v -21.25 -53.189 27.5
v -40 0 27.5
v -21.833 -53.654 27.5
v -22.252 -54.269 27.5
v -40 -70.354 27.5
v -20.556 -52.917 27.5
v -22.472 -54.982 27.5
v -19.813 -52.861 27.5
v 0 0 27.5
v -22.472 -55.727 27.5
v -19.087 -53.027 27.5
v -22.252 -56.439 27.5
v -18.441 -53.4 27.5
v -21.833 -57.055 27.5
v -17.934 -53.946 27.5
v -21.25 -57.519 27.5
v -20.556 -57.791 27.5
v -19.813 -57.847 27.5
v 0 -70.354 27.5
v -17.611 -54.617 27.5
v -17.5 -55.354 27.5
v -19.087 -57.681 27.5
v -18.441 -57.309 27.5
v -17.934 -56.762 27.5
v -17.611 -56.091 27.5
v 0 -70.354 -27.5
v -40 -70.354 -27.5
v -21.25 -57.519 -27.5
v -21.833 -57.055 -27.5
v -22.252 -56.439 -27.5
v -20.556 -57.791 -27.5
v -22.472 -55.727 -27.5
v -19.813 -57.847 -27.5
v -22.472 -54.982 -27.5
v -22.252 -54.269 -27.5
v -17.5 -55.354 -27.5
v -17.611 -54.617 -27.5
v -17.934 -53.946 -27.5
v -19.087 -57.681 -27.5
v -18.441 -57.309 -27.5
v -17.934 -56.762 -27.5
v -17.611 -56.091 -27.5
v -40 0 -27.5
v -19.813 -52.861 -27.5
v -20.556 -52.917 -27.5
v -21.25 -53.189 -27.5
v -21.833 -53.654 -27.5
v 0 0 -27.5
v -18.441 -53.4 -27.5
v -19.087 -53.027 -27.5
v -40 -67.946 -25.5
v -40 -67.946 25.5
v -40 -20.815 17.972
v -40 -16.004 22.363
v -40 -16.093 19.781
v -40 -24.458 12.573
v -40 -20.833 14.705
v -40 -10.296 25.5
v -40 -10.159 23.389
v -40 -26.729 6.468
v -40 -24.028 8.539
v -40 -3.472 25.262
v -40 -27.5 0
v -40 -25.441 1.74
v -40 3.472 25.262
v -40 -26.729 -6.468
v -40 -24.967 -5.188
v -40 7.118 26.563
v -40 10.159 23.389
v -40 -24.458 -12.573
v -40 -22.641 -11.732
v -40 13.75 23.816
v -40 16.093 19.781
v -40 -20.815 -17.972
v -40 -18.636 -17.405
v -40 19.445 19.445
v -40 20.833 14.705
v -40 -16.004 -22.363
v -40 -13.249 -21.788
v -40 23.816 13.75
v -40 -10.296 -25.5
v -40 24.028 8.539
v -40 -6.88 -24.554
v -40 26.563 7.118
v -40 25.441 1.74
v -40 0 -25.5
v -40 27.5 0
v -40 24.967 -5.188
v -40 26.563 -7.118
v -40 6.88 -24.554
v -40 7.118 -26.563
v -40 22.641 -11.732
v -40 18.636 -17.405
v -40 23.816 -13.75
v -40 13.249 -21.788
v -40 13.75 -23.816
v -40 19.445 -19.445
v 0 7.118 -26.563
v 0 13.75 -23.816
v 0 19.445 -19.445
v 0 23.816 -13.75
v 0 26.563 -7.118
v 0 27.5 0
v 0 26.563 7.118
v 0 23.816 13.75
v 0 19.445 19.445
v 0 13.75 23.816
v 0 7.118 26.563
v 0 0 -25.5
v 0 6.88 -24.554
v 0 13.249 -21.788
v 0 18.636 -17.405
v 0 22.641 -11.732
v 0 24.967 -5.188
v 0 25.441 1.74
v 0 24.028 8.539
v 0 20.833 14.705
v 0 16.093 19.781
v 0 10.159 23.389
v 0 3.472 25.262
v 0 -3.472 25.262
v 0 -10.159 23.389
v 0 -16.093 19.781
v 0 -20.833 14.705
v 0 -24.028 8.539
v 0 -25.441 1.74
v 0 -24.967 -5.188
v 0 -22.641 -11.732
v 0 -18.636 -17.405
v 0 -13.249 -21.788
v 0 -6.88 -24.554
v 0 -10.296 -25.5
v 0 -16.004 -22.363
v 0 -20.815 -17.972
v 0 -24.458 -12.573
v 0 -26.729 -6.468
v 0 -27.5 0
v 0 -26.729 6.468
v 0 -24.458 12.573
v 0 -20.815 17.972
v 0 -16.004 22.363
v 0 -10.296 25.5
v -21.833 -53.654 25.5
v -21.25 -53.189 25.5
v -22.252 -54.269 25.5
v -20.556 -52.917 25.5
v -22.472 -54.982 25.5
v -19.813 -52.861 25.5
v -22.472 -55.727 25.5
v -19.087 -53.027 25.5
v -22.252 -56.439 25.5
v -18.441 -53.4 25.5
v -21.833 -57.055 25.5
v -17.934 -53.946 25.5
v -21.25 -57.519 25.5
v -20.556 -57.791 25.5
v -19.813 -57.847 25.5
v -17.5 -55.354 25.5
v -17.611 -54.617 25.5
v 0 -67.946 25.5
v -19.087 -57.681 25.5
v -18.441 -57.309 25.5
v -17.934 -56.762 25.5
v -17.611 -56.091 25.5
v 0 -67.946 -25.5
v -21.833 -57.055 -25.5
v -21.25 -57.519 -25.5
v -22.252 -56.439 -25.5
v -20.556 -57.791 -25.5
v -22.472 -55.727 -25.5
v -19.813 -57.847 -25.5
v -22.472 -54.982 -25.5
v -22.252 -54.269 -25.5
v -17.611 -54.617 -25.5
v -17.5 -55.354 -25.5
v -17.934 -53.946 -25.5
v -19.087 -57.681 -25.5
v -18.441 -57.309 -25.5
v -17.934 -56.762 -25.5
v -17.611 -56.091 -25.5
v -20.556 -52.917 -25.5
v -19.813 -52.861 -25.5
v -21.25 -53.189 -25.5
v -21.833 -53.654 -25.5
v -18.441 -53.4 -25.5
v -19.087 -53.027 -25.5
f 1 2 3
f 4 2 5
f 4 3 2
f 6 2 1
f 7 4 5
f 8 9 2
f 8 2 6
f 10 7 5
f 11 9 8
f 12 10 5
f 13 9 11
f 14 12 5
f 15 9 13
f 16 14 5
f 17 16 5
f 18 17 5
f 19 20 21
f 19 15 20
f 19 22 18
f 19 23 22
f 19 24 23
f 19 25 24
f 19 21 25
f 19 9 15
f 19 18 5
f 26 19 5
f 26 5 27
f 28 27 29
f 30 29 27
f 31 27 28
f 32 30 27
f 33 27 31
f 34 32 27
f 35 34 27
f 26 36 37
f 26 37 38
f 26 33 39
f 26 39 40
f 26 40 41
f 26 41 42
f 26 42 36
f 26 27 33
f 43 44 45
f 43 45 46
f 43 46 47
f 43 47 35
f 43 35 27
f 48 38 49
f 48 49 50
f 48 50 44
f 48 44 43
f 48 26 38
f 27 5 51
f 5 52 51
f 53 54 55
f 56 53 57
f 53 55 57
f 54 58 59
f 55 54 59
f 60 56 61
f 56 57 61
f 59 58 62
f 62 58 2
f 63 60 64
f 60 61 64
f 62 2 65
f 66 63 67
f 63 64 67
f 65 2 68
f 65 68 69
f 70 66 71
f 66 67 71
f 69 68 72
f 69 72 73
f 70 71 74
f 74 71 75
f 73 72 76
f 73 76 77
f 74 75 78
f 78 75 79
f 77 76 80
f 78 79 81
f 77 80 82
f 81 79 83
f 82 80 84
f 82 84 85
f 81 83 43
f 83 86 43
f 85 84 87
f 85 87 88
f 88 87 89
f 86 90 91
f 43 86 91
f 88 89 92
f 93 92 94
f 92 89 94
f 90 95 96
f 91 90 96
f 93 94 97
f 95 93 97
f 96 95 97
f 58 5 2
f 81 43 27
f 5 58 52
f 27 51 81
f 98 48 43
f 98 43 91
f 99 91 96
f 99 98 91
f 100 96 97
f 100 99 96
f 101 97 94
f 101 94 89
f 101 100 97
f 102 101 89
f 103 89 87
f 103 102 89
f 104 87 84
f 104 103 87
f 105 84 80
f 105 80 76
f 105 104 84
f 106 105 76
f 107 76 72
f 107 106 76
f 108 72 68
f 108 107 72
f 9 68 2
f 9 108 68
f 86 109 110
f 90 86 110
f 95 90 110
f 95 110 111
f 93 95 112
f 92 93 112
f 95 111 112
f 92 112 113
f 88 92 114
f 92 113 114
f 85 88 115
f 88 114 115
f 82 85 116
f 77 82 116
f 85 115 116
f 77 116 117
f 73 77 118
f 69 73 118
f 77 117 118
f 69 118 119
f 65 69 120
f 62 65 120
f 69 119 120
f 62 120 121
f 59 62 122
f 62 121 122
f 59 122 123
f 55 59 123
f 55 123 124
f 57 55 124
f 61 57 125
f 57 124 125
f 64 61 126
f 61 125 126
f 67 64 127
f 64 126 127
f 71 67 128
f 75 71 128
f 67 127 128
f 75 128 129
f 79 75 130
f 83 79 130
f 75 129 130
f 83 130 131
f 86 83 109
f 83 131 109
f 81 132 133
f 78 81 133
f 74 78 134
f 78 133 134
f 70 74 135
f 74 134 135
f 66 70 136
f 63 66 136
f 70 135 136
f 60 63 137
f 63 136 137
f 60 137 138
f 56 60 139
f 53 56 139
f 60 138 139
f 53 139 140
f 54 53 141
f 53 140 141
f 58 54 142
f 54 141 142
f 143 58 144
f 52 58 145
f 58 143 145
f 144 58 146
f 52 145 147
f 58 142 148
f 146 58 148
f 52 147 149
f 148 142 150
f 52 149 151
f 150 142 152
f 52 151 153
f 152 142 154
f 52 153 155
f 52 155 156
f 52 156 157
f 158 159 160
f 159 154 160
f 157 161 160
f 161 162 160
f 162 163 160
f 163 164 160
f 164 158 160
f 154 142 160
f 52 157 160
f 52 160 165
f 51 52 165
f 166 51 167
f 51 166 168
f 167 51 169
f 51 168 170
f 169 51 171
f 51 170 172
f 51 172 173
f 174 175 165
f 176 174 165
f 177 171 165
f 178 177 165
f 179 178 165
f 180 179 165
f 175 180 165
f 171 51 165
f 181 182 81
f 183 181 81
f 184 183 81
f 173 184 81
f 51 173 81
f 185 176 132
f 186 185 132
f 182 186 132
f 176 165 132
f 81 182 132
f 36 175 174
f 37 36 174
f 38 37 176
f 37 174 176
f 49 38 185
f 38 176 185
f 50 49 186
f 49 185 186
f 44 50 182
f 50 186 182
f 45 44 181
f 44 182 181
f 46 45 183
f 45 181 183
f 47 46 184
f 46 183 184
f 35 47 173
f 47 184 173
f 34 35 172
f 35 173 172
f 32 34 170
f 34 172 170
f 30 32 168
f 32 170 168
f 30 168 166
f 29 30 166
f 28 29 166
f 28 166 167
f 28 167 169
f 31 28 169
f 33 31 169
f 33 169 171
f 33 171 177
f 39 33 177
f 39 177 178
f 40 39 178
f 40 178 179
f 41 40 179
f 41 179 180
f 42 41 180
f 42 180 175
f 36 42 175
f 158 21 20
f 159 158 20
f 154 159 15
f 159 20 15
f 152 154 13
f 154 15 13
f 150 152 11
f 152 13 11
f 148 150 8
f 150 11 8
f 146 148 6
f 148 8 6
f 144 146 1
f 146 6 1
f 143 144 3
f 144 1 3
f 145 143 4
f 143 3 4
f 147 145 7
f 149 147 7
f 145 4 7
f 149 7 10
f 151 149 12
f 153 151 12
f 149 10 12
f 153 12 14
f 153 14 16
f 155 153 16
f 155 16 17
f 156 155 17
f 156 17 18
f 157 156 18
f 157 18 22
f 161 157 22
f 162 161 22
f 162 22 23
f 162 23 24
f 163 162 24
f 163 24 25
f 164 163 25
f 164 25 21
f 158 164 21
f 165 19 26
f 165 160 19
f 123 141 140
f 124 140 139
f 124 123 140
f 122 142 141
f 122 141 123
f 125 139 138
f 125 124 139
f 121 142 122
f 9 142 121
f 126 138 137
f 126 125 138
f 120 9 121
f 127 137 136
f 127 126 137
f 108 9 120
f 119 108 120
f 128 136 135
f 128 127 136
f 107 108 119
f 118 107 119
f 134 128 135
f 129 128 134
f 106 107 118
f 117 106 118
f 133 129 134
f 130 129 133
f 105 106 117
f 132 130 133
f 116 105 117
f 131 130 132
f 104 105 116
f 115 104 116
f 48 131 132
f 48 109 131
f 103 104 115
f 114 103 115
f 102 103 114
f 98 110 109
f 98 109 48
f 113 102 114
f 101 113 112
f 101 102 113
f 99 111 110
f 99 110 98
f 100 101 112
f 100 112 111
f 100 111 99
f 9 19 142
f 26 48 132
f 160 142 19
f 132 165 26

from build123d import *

# Parameters (mm, degrees)
SKETCH1_R           = 25.5
BOSS_EXTRUDE1_DEPTH = 40
SKETCH2_R           = 2.5
CUT_EXTRUDE1_DEPTH  = 98.850406679


with BuildPart() as part:
    # Sketch1 → Boss-Extrude1 (new body)
    with BuildSketch(Plane(origin=(0, 0, 0), x_dir=(0, 0, -1), z_dir=(1, 0, 0))):
        with BuildLine():
            Line((-27.5, 0), (-27.5, -70.354119191))
            Line((-27.5, -70.354119191), (27.5, -70.354119191))
            Line((27.5, -70.354119191), (27.5, 0))
            ThreePointArc((27.5, 0), (0, 27.5), (-27.5, 0))
        make_face()
        Circle(SKETCH1_R, mode=Mode.SUBTRACT)
        with BuildLine():
            Line((-25.5, -10.295630141), (-25.5, -67.945646506))
            Line((-25.5, -67.945646506), (25.5, -67.945646506))
            Line((25.5, -67.945646506), (25.5, -10.295630141))
            ThreePointArc((25.5, -10.295630141), (0, -27.5), (-25.5, -10.295630141))
        make_face(mode=Mode.SUBTRACT)
    extrude(amount=-BOSS_EXTRUDE1_DEPTH)

    # Sketch2 → Cut-Extrude1 (cut, through all)
    with BuildSketch(Plane.XY.offset(27.5)):
        with Locations((-20, -55.354119191)):
            Circle(SKETCH2_R)
    extrude(amount=-CUT_EXTRUDE1_DEPTH, mode=Mode.SUBTRACT)


solid = part.part
